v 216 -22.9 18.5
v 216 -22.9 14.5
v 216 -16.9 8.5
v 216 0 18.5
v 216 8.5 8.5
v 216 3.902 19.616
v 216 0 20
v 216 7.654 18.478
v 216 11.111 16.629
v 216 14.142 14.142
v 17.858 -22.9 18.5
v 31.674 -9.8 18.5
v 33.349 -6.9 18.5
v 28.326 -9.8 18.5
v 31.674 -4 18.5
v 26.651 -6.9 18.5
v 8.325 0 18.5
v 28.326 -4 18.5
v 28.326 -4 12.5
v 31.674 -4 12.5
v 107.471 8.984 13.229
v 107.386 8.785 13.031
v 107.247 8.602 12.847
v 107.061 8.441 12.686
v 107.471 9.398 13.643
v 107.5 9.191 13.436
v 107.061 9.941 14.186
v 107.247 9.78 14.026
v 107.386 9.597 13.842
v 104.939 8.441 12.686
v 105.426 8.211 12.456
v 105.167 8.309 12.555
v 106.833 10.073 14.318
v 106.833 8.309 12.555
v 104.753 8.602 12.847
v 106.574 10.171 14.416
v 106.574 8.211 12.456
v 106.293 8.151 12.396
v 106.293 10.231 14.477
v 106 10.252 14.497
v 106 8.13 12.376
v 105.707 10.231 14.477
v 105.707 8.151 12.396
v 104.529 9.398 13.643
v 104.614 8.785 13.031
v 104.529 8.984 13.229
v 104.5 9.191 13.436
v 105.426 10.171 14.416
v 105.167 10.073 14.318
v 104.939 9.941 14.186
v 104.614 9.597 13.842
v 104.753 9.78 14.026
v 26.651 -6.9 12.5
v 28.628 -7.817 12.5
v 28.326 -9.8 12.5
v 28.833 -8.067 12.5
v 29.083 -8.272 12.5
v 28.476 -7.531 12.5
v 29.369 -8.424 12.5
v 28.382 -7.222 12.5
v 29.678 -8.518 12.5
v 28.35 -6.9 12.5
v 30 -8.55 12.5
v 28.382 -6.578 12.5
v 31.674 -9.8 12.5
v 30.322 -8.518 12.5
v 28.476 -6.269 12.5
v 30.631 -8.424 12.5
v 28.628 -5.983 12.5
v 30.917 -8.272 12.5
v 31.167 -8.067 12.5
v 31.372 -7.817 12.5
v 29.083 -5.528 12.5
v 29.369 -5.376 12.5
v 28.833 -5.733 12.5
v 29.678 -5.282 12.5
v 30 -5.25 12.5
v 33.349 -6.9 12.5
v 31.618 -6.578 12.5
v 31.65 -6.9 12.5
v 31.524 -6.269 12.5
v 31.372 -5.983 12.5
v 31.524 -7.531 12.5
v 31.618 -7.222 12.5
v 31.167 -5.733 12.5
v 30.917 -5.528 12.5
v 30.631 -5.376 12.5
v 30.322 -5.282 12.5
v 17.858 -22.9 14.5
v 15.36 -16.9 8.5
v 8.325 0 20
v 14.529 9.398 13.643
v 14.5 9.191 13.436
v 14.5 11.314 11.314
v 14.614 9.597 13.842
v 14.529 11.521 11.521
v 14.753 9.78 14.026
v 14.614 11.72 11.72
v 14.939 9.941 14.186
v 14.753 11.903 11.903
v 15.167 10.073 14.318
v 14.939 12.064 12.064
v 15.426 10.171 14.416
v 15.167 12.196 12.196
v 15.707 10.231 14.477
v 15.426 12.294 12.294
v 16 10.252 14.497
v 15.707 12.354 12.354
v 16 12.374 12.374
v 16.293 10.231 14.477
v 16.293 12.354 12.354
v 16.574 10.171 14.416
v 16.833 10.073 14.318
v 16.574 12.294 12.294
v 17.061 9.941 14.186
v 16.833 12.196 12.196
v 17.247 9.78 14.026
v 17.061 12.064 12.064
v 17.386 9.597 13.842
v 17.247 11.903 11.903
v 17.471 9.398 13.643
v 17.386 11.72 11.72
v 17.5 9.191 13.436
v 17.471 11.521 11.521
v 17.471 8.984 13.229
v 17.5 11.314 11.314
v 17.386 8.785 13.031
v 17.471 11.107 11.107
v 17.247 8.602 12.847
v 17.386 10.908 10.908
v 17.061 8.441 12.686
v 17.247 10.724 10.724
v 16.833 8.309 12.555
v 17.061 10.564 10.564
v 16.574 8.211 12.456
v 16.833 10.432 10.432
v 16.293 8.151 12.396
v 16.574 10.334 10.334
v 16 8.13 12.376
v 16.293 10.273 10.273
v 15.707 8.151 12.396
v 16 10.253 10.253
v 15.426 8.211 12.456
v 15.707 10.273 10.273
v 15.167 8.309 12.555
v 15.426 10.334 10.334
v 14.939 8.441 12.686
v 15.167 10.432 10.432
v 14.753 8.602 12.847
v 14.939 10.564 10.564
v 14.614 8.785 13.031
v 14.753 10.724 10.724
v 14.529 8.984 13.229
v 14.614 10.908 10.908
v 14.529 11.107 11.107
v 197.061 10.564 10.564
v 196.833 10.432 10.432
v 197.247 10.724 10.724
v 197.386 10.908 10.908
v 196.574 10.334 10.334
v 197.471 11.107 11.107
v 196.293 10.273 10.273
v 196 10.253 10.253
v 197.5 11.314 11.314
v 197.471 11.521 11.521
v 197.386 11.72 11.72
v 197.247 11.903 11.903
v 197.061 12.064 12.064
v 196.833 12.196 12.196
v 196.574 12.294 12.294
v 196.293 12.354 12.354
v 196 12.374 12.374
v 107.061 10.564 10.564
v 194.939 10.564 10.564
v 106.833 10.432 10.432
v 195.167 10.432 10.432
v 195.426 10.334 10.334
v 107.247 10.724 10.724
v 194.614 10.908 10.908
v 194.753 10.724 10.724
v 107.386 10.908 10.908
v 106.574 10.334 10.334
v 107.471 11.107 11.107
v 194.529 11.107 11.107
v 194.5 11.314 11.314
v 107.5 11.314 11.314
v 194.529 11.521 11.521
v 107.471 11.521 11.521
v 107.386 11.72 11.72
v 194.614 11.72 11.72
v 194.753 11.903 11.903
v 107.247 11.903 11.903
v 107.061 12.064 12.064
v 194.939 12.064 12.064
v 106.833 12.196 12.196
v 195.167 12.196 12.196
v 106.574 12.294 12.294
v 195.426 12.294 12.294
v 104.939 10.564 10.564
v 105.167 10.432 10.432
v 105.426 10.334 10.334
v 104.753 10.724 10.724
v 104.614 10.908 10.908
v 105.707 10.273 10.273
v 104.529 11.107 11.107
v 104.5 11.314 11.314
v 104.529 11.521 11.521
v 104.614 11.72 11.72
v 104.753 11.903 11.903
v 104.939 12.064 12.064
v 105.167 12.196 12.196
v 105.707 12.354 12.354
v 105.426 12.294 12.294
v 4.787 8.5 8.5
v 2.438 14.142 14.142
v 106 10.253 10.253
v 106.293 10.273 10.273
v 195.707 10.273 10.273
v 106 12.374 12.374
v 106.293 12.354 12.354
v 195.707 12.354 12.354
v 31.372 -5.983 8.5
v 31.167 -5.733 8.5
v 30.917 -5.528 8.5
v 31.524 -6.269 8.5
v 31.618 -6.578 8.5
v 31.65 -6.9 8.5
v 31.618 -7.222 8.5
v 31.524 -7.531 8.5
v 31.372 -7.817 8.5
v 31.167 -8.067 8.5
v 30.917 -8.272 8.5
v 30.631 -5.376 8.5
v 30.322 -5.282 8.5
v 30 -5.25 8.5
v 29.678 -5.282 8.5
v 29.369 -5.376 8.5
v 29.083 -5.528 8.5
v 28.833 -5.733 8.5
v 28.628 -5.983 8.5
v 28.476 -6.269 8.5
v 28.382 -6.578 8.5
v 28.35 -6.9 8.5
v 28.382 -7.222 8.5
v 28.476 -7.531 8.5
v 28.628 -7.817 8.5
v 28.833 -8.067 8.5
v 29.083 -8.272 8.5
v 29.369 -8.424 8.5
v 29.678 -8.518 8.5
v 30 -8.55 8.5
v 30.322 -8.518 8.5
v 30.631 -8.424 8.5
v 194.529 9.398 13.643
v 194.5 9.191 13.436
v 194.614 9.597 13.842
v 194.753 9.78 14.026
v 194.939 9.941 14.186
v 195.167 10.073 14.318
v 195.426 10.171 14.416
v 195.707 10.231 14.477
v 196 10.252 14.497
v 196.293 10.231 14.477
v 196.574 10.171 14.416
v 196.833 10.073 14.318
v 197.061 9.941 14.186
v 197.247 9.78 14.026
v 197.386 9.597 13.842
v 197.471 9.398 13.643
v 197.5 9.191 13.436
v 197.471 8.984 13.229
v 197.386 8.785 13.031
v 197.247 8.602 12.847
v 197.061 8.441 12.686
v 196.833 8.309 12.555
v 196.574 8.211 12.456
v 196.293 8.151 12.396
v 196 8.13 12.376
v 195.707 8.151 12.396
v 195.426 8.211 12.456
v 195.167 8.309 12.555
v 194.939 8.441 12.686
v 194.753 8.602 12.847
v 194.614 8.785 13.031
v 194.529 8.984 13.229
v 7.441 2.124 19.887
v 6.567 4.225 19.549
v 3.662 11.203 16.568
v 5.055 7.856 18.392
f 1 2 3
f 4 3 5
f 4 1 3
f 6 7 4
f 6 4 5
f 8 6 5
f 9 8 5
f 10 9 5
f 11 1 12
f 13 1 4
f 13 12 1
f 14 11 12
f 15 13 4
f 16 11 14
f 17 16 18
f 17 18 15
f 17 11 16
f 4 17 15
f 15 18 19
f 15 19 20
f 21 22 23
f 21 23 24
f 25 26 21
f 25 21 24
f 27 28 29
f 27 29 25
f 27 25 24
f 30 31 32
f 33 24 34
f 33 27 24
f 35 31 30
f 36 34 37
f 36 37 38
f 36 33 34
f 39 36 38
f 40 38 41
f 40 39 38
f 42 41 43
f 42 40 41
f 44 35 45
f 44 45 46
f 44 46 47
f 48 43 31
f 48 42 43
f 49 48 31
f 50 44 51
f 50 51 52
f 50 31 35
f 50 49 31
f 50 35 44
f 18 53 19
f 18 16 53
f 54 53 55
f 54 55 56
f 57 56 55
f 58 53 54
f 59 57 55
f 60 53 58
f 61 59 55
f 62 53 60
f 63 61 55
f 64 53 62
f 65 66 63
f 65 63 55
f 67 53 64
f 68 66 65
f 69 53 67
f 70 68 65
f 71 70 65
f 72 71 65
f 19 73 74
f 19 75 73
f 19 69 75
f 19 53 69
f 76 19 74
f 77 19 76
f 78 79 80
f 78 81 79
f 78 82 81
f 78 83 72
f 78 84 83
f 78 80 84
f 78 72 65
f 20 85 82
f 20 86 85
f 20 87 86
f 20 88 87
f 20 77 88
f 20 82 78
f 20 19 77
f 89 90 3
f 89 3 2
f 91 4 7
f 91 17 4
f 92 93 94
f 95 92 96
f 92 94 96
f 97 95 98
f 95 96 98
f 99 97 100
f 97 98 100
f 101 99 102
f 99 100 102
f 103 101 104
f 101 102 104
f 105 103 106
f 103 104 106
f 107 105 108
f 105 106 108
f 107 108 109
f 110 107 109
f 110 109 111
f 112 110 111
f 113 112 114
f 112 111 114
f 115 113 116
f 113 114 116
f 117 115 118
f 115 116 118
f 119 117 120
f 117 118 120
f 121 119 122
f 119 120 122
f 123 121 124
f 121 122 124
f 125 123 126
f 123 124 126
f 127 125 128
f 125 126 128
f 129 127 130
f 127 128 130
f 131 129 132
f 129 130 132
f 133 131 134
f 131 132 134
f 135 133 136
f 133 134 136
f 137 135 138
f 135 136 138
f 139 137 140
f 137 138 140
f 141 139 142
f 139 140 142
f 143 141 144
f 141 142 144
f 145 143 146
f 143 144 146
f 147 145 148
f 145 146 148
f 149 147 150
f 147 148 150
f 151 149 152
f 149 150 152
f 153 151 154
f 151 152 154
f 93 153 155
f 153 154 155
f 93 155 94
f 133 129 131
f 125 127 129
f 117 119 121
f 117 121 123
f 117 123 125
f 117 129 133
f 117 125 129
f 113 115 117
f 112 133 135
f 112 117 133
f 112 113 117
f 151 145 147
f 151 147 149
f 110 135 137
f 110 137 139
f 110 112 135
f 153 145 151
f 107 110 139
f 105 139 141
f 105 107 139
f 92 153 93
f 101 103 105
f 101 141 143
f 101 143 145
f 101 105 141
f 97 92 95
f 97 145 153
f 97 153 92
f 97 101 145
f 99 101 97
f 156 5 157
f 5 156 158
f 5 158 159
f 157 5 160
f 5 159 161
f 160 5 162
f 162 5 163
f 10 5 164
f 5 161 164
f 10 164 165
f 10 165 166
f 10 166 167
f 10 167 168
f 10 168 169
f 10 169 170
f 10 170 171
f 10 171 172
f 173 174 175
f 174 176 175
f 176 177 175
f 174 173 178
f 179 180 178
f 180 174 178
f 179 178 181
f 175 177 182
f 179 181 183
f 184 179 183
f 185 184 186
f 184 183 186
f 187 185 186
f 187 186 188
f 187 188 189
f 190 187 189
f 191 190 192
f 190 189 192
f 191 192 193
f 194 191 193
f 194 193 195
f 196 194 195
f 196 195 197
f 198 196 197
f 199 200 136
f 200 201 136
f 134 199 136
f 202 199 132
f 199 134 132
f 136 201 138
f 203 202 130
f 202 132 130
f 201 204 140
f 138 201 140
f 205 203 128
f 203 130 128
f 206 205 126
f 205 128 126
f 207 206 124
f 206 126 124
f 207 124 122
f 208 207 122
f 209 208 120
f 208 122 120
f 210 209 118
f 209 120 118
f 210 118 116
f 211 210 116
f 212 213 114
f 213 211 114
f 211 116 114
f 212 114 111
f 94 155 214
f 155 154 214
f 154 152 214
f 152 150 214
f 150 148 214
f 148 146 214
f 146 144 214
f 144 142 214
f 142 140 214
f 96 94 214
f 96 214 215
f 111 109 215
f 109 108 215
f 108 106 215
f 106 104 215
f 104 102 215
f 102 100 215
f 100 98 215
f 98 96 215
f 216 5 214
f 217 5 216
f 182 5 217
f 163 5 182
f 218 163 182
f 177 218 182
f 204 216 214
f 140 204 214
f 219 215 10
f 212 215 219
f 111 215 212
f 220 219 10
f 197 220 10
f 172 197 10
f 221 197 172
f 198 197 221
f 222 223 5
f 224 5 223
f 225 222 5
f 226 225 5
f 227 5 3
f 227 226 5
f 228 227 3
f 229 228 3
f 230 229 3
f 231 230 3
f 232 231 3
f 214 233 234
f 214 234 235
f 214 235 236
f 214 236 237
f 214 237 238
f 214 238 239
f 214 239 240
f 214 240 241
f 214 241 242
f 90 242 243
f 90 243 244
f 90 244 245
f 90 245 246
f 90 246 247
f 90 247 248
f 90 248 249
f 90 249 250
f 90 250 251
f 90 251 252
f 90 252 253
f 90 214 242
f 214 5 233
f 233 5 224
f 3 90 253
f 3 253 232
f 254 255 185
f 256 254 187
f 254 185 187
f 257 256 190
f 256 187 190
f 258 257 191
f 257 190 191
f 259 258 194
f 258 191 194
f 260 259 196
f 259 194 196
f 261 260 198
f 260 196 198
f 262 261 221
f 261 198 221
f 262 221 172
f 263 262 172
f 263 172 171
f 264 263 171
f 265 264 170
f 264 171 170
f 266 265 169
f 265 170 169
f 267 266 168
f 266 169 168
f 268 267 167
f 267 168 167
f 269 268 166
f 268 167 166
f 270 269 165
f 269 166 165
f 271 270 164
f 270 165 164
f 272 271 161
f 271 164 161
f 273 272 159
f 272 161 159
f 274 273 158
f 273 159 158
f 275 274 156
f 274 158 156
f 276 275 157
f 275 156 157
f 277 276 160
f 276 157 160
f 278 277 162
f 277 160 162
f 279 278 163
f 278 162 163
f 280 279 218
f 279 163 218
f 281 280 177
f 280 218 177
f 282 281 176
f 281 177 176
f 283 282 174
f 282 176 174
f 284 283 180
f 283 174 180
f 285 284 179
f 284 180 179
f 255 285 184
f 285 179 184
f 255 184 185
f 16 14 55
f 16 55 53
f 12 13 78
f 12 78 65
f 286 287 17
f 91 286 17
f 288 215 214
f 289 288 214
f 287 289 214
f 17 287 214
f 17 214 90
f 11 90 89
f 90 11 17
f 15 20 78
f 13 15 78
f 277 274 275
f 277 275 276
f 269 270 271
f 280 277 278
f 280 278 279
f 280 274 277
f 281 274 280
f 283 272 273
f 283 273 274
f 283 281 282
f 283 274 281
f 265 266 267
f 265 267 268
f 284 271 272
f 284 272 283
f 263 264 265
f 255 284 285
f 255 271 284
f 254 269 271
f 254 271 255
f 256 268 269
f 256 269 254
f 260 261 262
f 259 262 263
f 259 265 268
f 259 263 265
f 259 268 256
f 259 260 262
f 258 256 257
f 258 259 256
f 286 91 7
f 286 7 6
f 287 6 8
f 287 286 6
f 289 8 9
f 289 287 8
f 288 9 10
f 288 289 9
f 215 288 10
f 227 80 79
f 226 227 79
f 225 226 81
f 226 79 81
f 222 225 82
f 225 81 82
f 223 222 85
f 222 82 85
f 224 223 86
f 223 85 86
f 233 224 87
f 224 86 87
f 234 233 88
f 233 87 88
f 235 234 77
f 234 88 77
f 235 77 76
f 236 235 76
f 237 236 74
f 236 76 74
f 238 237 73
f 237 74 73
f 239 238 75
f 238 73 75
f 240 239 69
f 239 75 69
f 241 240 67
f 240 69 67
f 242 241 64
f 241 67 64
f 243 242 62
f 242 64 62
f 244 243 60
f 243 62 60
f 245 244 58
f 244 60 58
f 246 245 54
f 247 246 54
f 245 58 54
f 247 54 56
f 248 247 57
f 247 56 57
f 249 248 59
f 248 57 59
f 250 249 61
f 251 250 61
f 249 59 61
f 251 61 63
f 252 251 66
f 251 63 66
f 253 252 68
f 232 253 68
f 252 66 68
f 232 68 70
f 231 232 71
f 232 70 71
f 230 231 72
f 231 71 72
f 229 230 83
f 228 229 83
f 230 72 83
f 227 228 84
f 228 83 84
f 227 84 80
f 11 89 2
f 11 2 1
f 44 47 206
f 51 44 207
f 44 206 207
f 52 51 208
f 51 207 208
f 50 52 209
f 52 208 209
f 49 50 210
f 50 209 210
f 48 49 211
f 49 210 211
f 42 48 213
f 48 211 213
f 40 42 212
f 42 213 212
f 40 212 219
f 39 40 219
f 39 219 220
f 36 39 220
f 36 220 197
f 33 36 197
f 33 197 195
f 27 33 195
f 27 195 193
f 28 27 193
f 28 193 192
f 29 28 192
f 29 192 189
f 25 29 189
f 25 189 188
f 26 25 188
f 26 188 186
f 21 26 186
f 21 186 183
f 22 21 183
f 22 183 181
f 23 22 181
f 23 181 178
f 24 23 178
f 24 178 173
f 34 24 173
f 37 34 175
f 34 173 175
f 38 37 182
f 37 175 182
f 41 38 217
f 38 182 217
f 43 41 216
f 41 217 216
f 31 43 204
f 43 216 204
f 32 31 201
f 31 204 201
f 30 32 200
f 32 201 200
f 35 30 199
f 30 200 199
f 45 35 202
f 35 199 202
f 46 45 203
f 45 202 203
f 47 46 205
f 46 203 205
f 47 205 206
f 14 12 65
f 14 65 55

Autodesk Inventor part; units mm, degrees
ref_plane "YZ Plane" through (0, 0, 0) normal (1, 0, 0) x (0, 1, 0)
ref_plane "XZ Plane" through (0, 0, 0) normal (0, 1, 0) x (-1, 0, 0)
ref_plane "XY Plane" through (0, 0, 0) normal (0, 0, 1) x (1, 0, 0)
sketch "Sketch1" plane through (0, 0, 0) normal (1, 0, 0) x (0, 1, 0)
  circle A0 centre (0, 0) radius 20
  line L0 (8.5, 8.5) -> (-16.9, 8.5)
  line L1 (8.5, 8.5) -> (8.5, -16.9)
  line L2 (0, 0) -> (0, 20)
  line L3 (0, 20) -> (-60.9241, 20)
  line L4 (-60.9241, 20) -> (-60.9241, 18.5)
  line L5 (-60.9241, 18.5) -> (0, 18.5)
  line L6 (0, 18.5) -> (0, 20)
  line L7 (0, 0) -> (14.1421, 14.1421)
  line L8 (0, 0) -> (20, 0)
  line L9 (-16.9, 8.5) -> (-16.9, 18.5)
  line L10 (-16.9, 8.5) -> (-22.9, 14.5)
  line L11 (-22.9, 14.5) -> (-22.9, 18.5)
  line L12 (12.3744, 12.3744) -> (12.1502, 13.2109)
  line L13 (11.3137, 13.435) -> (9.2071, 11.3284)
  line L14 (9.4313, 10.4919) -> (10.2678, 10.2678)
  line L15 (8.5, 8.5) -> (8.5, -16.9)
  line L16 (20, 0) -> (20, -60.9241)
  line L17 (20, -60.9241) -> (18.5, -60.9241)
  line L18 (18.5, -60.9241) -> (18.5, 0)
  line L19 (8.5, -16.9) -> (18.5, -16.9)
  line L20 (8.5, -16.9) -> (14.5, -22.9)
  line L21 (14.5, -22.9) -> (18.5, -22.9)
  arc A1 (9.2071, 11.3284) -> (9.4313, 10.4919) centre (9.5607, 10.9749) ccw
  arc A2 (12.1502, 13.2109) -> (11.3137, 13.435) centre (11.6673, 13.0815) ccw
  line L22 (10.4311, 10.4311) -> (9.483, 10.6851)
  arc A3 (9.3485, 11.187) -> (9.483, 10.6851) centre (9.5607, 10.9749) ccw
  line L23 (9.3485, 11.187) -> (11.4551, 13.2936)
  arc A4 (11.957, 13.1591) -> (11.4551, 13.2936) centre (11.6673, 13.0815) ccw
  line L24 (11.957, 13.1591) -> (12.2111, 12.2111)
  point P0 (0, 8.5)
  point P1 (-17.7041, 9.3041)
  point P2 (-16.9, 10.6953)
  dimension "d0" = 40
  dimension "d1" = 25.4
  dimension "d2" = 1.5
  dimension "d4" = 45
  dimension "d6" = 45
  dimension "d7" = 4
  dimension "d8" = 10
  dimension "d10" = 2.5
  dimension "d11" = 2.5
  dimension "d12" = 60
  dimension "d13" = 1.5
  dimension "d15" = 0.5
  dimension "d16" = 0.2
extrude "Extrusion1" add sketch "Sketch1" along normal blind 216 contours L7 L12 A2 L13 A1 L14 L0 L2 A0 | L7 L24 A4 L23 A3 L22 L14 A1 L13 A2 L12 | L5 L2 L0 L9 A0 | A0 L9 L5 | L7 L22 A3 L23 A4 L24 | L9 L10 A0 | A0 L10 L11 L5 L9
sketch "Sketch2" plane through (0, -22.9, 18.5) normal (0, 0, 1) x (1, 0, 0)
  line L0 (0, 22.9) -> (0, 0) projected
  line L1 (0, 0) -> (216, 0) projected
  line L2 (216, 22.9) -> (216, 0) projected
  line L3 (0, 22.9) -> (216, 22.9) projected
  line L4 (28.3257, 13.1) -> (26.6514, 16)
  line L5 (26.6514, 16) -> (28.3257, 18.9)
  line L6 (28.3257, 18.9) -> (31.6743, 18.9)
  line L7 (31.6743, 18.9) -> (33.3486, 16)
  line L8 (33.3486, 16) -> (31.6743, 13.1)
  line L9 (31.6743, 13.1) -> (28.3257, 13.1)
  line L10 (0, 6) -> (216, 6) projected
  circle A0 centre (30, 16) radius 1.65
  dimension "d20" = 10
  dimension "d21" = 5.8
  dimension "d22" = 30
  dimension "d25" = 3.3
extrude "Extrusion2" cut sketch "Sketch2" against normal blind 6 contours L4 L5 L6 L7 L8 L9 | A0
extrude "Extrusion3" cut sketch "Sketch2" against normal through all contours A0
sketch "Sketch3" plane through (0, -22.9, 18.5) normal (0, 0, 1) x (1, 0, 0)
  line L0 (0, 37.0421) -> (216, 37.0421) projected
  line L1 (0, 0) -> (216, 0) projected
  line L2 (0, 22.9) -> (0, 0) projected
  line L3 (0, 22.9) -> (0, 37.0421) projected
  line L4 (2.4384, 37.0421) -> (17.8575, 0)
  line L5 (0, 0) -> (216, 0) projected
  line L6 (2.4384, 37.0421) -> (0, 42.9) projected
  point P0 (0, 26.9698)
  dimension "d28" = 112.6
sketch "Sketch4" plane through (216, 14.1421, 14.1421) normal (0, 0.7071, -0.7071) x (-1, 0, 0)
  line L0 (216, 0) -> (0, 0) projected
  line L1 (0, -7.9792) -> (0, 0) projected
  line L2 (216, -7.9792) -> (0, -7.9792) projected
  circle A0 centre (20, -4) radius 1.5
  circle A1 centre (110, -4) radius 1.5
  circle A2 centre (200, -4) radius 1.5
  line L3 (216, -7.9792) -> (216, 0) projected
  point P0 (216, -20)
  dimension "d34" = 3
  dimension "d35" = 4
  dimension "d36" = 20
  dimension "d39" = 90
extrude "Extrusion5" cut sketch "Sketch4" against normal blind 3 contours A0 | A1 | A2
extrude "Extrusion6" cut sketch "Sketch3" along normal through all both and the other way through all
properties part number "ESQUINA_REDONDEADA_R20" material "Steel, Mild, Welded"
